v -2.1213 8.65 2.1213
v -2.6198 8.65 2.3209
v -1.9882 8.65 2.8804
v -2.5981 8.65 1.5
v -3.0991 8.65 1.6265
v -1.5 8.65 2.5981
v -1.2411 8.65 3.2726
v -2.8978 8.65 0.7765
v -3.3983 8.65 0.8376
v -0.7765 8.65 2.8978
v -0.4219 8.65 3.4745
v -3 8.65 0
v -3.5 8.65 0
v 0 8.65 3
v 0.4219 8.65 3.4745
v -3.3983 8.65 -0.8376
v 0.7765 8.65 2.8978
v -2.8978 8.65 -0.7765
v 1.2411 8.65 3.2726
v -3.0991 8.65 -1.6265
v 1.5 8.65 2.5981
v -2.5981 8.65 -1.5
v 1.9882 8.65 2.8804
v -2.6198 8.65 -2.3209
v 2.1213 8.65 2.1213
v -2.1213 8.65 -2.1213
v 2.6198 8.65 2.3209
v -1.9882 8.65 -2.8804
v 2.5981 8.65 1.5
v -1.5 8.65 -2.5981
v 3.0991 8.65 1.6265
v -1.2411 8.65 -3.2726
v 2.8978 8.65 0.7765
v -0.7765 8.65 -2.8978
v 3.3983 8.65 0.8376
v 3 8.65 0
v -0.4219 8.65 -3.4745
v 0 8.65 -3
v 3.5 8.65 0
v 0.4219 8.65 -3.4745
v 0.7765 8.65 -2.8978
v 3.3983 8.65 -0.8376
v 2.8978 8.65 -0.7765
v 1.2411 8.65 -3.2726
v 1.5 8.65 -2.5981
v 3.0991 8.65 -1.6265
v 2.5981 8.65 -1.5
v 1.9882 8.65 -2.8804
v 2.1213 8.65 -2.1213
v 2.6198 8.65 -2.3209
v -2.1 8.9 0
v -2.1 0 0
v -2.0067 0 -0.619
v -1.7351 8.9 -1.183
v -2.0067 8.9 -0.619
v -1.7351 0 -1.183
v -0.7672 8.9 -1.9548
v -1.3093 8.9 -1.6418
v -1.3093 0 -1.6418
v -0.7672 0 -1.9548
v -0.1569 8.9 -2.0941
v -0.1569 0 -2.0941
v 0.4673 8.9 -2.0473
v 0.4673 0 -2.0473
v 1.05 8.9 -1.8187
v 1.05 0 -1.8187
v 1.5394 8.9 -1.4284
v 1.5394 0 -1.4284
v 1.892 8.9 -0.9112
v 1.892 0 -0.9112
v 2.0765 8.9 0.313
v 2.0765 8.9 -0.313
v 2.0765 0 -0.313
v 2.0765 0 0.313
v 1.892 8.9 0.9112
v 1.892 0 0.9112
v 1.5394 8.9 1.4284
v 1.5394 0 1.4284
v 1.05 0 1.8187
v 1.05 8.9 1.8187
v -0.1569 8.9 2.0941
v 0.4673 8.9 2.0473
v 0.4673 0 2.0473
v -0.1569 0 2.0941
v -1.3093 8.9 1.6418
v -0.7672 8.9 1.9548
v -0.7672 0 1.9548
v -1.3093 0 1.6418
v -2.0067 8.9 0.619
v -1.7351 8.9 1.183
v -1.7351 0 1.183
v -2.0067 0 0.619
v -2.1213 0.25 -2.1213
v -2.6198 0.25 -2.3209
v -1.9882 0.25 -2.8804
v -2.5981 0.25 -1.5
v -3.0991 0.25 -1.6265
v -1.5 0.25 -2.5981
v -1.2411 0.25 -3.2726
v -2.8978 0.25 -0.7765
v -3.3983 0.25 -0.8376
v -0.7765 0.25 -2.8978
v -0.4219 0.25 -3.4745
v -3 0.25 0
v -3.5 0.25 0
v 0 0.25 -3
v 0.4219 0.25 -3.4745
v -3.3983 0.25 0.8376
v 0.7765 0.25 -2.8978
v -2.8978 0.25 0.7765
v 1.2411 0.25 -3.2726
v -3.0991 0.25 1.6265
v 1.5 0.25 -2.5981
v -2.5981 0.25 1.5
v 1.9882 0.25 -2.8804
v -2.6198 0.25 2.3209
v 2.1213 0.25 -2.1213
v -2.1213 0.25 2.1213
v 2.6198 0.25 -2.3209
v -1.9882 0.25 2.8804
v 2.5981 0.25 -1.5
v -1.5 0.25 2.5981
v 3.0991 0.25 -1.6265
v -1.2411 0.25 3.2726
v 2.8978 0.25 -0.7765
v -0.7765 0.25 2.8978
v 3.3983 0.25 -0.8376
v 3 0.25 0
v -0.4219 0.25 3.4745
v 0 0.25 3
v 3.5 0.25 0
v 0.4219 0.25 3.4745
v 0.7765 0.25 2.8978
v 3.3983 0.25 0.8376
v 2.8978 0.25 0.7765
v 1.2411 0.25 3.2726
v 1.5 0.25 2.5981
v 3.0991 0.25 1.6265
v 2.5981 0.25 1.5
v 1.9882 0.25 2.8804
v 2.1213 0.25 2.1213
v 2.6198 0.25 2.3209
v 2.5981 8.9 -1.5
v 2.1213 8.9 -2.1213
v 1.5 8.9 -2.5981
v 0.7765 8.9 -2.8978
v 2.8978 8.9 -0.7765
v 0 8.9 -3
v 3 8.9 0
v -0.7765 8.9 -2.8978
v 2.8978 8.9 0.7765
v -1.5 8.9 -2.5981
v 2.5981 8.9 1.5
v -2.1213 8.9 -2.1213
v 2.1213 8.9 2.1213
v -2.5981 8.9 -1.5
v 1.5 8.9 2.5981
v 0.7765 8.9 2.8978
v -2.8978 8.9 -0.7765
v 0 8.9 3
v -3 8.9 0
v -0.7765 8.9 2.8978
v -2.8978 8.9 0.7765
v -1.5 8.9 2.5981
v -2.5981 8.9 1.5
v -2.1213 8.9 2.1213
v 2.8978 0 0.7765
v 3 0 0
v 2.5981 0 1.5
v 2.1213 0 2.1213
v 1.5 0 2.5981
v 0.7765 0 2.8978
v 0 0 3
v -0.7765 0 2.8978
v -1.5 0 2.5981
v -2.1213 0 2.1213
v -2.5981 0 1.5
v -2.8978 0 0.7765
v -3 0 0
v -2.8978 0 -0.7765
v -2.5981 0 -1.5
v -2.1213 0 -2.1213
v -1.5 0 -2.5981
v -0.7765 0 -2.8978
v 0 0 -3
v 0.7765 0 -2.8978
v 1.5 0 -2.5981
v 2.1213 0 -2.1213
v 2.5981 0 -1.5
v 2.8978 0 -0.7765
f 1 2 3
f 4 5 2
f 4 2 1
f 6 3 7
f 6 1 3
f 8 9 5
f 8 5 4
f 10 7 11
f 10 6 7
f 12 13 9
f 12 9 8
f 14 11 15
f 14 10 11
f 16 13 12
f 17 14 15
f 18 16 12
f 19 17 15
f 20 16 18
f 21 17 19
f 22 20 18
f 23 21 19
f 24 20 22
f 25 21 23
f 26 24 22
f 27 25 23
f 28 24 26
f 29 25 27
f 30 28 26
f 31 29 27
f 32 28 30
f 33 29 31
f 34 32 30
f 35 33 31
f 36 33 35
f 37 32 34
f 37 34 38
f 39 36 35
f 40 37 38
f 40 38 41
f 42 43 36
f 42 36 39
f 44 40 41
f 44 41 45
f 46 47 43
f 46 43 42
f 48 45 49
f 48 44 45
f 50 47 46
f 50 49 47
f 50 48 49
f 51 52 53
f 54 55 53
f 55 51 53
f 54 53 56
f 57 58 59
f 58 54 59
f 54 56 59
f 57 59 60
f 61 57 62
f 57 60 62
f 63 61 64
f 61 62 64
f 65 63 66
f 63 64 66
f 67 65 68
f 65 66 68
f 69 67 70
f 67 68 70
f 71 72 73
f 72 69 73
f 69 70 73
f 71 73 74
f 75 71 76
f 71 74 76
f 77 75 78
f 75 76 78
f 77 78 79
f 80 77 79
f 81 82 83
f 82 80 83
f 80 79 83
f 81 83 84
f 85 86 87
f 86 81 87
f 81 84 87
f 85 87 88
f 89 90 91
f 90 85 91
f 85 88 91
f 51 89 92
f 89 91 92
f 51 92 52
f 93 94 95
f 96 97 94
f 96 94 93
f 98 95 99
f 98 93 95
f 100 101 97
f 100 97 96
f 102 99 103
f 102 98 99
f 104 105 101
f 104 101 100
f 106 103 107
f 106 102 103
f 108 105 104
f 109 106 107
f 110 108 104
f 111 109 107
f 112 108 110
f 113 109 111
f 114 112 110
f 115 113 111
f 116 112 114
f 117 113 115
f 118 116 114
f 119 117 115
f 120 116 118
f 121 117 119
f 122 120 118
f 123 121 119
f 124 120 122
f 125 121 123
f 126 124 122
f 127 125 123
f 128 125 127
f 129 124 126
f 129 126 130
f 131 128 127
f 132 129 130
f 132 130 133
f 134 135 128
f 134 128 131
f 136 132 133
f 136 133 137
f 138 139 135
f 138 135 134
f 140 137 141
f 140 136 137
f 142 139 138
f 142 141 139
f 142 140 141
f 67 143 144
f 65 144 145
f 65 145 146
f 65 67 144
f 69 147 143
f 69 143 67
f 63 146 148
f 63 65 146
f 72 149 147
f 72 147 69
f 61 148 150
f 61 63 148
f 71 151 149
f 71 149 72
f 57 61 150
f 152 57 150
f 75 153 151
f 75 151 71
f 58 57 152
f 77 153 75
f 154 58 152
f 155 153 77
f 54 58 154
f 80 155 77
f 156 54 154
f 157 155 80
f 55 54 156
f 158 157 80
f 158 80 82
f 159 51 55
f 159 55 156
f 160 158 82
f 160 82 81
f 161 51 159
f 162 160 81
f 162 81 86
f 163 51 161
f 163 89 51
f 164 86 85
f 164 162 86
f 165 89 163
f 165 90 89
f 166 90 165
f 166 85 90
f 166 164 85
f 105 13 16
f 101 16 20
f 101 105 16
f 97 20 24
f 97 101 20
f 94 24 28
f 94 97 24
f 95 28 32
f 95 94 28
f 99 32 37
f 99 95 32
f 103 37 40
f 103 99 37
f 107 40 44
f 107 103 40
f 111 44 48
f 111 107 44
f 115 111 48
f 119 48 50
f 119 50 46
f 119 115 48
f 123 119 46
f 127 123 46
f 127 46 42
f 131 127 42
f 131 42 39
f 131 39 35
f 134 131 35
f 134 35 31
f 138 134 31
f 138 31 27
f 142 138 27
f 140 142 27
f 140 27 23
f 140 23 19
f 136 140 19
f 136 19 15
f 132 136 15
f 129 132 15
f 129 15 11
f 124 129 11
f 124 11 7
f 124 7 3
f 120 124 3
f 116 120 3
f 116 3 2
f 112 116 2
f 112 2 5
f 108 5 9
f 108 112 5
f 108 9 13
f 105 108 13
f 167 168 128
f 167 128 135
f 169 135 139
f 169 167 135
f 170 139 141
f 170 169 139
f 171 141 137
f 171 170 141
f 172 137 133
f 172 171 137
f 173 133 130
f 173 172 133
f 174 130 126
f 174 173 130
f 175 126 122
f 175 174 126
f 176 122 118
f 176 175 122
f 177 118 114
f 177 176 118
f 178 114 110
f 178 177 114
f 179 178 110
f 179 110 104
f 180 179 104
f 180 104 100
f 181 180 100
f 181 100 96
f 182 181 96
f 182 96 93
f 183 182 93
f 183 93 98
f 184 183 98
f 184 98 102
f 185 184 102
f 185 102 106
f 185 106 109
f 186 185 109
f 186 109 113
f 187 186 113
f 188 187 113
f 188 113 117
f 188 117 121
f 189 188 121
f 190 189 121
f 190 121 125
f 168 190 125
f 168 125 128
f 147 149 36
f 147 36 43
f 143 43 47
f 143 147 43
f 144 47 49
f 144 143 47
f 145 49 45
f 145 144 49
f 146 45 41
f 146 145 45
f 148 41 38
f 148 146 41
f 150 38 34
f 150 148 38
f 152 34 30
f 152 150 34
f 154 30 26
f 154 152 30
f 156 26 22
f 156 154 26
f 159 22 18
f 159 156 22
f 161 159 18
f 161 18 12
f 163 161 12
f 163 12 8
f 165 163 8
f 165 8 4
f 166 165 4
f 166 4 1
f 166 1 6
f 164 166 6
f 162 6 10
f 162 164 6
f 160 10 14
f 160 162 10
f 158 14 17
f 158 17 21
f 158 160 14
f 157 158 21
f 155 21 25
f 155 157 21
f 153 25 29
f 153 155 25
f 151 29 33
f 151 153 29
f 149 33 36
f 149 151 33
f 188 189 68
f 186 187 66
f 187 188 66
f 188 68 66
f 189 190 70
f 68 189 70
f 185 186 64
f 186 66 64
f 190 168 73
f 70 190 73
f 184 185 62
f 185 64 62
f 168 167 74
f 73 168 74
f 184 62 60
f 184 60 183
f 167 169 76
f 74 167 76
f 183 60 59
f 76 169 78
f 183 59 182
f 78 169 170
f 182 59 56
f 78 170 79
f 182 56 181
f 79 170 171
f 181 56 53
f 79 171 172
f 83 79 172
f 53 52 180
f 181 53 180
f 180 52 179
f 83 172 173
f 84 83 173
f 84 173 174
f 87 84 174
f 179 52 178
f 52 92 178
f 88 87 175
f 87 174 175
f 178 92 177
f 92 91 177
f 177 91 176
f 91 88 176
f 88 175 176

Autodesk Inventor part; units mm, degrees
ref_plane "YZ Plane" through (0, 0, 0) normal (1, 0, 0) x (0, 1, 0)
ref_plane "XZ Plane" through (0, 0, 0) normal (0, 1, 0) x (-1, 0, 0)
ref_plane "XY Plane" through (0, 0, 0) normal (0, 0, 1) x (1, 0, 0)
sketch "Sketch1" plane through (0, 0, 0) normal (0, 1, 0) x (-1, 0, 0)
  circle A0 centre (0, 0) radius 3.5
  circle A1 centre (0, 0) radius 2.1
  dimension "d0" = 7
  dimension "d1" = 4.2
extrude "Extrusion1" add sketch "Sketch1" along normal blind 8.9
sketch "Sketch2" plane through (0, 8.9, 0) normal (0, 1, 0) x (1, 0, 0)
  circle A0 centre (0, 0) radius 3.5 projected
  circle A1 centre (0, 0) radius 3
  dimension "d4" = 6
extrude "Extrusion2" cut sketch "Sketch2" against normal blind 0.25
sketch "Sketch3" plane through (0, 0, 0) normal (0, -1, 0) x (1, 0, 0)
  circle A0 centre (0, 0) radius 3.5 projected
  circle A1 centre (0, 0) radius 3 projected
extrude "Extrusion3" cut sketch "Sketch3" against normal blind 0.25
properties part number "InnerBearingSpacer"
